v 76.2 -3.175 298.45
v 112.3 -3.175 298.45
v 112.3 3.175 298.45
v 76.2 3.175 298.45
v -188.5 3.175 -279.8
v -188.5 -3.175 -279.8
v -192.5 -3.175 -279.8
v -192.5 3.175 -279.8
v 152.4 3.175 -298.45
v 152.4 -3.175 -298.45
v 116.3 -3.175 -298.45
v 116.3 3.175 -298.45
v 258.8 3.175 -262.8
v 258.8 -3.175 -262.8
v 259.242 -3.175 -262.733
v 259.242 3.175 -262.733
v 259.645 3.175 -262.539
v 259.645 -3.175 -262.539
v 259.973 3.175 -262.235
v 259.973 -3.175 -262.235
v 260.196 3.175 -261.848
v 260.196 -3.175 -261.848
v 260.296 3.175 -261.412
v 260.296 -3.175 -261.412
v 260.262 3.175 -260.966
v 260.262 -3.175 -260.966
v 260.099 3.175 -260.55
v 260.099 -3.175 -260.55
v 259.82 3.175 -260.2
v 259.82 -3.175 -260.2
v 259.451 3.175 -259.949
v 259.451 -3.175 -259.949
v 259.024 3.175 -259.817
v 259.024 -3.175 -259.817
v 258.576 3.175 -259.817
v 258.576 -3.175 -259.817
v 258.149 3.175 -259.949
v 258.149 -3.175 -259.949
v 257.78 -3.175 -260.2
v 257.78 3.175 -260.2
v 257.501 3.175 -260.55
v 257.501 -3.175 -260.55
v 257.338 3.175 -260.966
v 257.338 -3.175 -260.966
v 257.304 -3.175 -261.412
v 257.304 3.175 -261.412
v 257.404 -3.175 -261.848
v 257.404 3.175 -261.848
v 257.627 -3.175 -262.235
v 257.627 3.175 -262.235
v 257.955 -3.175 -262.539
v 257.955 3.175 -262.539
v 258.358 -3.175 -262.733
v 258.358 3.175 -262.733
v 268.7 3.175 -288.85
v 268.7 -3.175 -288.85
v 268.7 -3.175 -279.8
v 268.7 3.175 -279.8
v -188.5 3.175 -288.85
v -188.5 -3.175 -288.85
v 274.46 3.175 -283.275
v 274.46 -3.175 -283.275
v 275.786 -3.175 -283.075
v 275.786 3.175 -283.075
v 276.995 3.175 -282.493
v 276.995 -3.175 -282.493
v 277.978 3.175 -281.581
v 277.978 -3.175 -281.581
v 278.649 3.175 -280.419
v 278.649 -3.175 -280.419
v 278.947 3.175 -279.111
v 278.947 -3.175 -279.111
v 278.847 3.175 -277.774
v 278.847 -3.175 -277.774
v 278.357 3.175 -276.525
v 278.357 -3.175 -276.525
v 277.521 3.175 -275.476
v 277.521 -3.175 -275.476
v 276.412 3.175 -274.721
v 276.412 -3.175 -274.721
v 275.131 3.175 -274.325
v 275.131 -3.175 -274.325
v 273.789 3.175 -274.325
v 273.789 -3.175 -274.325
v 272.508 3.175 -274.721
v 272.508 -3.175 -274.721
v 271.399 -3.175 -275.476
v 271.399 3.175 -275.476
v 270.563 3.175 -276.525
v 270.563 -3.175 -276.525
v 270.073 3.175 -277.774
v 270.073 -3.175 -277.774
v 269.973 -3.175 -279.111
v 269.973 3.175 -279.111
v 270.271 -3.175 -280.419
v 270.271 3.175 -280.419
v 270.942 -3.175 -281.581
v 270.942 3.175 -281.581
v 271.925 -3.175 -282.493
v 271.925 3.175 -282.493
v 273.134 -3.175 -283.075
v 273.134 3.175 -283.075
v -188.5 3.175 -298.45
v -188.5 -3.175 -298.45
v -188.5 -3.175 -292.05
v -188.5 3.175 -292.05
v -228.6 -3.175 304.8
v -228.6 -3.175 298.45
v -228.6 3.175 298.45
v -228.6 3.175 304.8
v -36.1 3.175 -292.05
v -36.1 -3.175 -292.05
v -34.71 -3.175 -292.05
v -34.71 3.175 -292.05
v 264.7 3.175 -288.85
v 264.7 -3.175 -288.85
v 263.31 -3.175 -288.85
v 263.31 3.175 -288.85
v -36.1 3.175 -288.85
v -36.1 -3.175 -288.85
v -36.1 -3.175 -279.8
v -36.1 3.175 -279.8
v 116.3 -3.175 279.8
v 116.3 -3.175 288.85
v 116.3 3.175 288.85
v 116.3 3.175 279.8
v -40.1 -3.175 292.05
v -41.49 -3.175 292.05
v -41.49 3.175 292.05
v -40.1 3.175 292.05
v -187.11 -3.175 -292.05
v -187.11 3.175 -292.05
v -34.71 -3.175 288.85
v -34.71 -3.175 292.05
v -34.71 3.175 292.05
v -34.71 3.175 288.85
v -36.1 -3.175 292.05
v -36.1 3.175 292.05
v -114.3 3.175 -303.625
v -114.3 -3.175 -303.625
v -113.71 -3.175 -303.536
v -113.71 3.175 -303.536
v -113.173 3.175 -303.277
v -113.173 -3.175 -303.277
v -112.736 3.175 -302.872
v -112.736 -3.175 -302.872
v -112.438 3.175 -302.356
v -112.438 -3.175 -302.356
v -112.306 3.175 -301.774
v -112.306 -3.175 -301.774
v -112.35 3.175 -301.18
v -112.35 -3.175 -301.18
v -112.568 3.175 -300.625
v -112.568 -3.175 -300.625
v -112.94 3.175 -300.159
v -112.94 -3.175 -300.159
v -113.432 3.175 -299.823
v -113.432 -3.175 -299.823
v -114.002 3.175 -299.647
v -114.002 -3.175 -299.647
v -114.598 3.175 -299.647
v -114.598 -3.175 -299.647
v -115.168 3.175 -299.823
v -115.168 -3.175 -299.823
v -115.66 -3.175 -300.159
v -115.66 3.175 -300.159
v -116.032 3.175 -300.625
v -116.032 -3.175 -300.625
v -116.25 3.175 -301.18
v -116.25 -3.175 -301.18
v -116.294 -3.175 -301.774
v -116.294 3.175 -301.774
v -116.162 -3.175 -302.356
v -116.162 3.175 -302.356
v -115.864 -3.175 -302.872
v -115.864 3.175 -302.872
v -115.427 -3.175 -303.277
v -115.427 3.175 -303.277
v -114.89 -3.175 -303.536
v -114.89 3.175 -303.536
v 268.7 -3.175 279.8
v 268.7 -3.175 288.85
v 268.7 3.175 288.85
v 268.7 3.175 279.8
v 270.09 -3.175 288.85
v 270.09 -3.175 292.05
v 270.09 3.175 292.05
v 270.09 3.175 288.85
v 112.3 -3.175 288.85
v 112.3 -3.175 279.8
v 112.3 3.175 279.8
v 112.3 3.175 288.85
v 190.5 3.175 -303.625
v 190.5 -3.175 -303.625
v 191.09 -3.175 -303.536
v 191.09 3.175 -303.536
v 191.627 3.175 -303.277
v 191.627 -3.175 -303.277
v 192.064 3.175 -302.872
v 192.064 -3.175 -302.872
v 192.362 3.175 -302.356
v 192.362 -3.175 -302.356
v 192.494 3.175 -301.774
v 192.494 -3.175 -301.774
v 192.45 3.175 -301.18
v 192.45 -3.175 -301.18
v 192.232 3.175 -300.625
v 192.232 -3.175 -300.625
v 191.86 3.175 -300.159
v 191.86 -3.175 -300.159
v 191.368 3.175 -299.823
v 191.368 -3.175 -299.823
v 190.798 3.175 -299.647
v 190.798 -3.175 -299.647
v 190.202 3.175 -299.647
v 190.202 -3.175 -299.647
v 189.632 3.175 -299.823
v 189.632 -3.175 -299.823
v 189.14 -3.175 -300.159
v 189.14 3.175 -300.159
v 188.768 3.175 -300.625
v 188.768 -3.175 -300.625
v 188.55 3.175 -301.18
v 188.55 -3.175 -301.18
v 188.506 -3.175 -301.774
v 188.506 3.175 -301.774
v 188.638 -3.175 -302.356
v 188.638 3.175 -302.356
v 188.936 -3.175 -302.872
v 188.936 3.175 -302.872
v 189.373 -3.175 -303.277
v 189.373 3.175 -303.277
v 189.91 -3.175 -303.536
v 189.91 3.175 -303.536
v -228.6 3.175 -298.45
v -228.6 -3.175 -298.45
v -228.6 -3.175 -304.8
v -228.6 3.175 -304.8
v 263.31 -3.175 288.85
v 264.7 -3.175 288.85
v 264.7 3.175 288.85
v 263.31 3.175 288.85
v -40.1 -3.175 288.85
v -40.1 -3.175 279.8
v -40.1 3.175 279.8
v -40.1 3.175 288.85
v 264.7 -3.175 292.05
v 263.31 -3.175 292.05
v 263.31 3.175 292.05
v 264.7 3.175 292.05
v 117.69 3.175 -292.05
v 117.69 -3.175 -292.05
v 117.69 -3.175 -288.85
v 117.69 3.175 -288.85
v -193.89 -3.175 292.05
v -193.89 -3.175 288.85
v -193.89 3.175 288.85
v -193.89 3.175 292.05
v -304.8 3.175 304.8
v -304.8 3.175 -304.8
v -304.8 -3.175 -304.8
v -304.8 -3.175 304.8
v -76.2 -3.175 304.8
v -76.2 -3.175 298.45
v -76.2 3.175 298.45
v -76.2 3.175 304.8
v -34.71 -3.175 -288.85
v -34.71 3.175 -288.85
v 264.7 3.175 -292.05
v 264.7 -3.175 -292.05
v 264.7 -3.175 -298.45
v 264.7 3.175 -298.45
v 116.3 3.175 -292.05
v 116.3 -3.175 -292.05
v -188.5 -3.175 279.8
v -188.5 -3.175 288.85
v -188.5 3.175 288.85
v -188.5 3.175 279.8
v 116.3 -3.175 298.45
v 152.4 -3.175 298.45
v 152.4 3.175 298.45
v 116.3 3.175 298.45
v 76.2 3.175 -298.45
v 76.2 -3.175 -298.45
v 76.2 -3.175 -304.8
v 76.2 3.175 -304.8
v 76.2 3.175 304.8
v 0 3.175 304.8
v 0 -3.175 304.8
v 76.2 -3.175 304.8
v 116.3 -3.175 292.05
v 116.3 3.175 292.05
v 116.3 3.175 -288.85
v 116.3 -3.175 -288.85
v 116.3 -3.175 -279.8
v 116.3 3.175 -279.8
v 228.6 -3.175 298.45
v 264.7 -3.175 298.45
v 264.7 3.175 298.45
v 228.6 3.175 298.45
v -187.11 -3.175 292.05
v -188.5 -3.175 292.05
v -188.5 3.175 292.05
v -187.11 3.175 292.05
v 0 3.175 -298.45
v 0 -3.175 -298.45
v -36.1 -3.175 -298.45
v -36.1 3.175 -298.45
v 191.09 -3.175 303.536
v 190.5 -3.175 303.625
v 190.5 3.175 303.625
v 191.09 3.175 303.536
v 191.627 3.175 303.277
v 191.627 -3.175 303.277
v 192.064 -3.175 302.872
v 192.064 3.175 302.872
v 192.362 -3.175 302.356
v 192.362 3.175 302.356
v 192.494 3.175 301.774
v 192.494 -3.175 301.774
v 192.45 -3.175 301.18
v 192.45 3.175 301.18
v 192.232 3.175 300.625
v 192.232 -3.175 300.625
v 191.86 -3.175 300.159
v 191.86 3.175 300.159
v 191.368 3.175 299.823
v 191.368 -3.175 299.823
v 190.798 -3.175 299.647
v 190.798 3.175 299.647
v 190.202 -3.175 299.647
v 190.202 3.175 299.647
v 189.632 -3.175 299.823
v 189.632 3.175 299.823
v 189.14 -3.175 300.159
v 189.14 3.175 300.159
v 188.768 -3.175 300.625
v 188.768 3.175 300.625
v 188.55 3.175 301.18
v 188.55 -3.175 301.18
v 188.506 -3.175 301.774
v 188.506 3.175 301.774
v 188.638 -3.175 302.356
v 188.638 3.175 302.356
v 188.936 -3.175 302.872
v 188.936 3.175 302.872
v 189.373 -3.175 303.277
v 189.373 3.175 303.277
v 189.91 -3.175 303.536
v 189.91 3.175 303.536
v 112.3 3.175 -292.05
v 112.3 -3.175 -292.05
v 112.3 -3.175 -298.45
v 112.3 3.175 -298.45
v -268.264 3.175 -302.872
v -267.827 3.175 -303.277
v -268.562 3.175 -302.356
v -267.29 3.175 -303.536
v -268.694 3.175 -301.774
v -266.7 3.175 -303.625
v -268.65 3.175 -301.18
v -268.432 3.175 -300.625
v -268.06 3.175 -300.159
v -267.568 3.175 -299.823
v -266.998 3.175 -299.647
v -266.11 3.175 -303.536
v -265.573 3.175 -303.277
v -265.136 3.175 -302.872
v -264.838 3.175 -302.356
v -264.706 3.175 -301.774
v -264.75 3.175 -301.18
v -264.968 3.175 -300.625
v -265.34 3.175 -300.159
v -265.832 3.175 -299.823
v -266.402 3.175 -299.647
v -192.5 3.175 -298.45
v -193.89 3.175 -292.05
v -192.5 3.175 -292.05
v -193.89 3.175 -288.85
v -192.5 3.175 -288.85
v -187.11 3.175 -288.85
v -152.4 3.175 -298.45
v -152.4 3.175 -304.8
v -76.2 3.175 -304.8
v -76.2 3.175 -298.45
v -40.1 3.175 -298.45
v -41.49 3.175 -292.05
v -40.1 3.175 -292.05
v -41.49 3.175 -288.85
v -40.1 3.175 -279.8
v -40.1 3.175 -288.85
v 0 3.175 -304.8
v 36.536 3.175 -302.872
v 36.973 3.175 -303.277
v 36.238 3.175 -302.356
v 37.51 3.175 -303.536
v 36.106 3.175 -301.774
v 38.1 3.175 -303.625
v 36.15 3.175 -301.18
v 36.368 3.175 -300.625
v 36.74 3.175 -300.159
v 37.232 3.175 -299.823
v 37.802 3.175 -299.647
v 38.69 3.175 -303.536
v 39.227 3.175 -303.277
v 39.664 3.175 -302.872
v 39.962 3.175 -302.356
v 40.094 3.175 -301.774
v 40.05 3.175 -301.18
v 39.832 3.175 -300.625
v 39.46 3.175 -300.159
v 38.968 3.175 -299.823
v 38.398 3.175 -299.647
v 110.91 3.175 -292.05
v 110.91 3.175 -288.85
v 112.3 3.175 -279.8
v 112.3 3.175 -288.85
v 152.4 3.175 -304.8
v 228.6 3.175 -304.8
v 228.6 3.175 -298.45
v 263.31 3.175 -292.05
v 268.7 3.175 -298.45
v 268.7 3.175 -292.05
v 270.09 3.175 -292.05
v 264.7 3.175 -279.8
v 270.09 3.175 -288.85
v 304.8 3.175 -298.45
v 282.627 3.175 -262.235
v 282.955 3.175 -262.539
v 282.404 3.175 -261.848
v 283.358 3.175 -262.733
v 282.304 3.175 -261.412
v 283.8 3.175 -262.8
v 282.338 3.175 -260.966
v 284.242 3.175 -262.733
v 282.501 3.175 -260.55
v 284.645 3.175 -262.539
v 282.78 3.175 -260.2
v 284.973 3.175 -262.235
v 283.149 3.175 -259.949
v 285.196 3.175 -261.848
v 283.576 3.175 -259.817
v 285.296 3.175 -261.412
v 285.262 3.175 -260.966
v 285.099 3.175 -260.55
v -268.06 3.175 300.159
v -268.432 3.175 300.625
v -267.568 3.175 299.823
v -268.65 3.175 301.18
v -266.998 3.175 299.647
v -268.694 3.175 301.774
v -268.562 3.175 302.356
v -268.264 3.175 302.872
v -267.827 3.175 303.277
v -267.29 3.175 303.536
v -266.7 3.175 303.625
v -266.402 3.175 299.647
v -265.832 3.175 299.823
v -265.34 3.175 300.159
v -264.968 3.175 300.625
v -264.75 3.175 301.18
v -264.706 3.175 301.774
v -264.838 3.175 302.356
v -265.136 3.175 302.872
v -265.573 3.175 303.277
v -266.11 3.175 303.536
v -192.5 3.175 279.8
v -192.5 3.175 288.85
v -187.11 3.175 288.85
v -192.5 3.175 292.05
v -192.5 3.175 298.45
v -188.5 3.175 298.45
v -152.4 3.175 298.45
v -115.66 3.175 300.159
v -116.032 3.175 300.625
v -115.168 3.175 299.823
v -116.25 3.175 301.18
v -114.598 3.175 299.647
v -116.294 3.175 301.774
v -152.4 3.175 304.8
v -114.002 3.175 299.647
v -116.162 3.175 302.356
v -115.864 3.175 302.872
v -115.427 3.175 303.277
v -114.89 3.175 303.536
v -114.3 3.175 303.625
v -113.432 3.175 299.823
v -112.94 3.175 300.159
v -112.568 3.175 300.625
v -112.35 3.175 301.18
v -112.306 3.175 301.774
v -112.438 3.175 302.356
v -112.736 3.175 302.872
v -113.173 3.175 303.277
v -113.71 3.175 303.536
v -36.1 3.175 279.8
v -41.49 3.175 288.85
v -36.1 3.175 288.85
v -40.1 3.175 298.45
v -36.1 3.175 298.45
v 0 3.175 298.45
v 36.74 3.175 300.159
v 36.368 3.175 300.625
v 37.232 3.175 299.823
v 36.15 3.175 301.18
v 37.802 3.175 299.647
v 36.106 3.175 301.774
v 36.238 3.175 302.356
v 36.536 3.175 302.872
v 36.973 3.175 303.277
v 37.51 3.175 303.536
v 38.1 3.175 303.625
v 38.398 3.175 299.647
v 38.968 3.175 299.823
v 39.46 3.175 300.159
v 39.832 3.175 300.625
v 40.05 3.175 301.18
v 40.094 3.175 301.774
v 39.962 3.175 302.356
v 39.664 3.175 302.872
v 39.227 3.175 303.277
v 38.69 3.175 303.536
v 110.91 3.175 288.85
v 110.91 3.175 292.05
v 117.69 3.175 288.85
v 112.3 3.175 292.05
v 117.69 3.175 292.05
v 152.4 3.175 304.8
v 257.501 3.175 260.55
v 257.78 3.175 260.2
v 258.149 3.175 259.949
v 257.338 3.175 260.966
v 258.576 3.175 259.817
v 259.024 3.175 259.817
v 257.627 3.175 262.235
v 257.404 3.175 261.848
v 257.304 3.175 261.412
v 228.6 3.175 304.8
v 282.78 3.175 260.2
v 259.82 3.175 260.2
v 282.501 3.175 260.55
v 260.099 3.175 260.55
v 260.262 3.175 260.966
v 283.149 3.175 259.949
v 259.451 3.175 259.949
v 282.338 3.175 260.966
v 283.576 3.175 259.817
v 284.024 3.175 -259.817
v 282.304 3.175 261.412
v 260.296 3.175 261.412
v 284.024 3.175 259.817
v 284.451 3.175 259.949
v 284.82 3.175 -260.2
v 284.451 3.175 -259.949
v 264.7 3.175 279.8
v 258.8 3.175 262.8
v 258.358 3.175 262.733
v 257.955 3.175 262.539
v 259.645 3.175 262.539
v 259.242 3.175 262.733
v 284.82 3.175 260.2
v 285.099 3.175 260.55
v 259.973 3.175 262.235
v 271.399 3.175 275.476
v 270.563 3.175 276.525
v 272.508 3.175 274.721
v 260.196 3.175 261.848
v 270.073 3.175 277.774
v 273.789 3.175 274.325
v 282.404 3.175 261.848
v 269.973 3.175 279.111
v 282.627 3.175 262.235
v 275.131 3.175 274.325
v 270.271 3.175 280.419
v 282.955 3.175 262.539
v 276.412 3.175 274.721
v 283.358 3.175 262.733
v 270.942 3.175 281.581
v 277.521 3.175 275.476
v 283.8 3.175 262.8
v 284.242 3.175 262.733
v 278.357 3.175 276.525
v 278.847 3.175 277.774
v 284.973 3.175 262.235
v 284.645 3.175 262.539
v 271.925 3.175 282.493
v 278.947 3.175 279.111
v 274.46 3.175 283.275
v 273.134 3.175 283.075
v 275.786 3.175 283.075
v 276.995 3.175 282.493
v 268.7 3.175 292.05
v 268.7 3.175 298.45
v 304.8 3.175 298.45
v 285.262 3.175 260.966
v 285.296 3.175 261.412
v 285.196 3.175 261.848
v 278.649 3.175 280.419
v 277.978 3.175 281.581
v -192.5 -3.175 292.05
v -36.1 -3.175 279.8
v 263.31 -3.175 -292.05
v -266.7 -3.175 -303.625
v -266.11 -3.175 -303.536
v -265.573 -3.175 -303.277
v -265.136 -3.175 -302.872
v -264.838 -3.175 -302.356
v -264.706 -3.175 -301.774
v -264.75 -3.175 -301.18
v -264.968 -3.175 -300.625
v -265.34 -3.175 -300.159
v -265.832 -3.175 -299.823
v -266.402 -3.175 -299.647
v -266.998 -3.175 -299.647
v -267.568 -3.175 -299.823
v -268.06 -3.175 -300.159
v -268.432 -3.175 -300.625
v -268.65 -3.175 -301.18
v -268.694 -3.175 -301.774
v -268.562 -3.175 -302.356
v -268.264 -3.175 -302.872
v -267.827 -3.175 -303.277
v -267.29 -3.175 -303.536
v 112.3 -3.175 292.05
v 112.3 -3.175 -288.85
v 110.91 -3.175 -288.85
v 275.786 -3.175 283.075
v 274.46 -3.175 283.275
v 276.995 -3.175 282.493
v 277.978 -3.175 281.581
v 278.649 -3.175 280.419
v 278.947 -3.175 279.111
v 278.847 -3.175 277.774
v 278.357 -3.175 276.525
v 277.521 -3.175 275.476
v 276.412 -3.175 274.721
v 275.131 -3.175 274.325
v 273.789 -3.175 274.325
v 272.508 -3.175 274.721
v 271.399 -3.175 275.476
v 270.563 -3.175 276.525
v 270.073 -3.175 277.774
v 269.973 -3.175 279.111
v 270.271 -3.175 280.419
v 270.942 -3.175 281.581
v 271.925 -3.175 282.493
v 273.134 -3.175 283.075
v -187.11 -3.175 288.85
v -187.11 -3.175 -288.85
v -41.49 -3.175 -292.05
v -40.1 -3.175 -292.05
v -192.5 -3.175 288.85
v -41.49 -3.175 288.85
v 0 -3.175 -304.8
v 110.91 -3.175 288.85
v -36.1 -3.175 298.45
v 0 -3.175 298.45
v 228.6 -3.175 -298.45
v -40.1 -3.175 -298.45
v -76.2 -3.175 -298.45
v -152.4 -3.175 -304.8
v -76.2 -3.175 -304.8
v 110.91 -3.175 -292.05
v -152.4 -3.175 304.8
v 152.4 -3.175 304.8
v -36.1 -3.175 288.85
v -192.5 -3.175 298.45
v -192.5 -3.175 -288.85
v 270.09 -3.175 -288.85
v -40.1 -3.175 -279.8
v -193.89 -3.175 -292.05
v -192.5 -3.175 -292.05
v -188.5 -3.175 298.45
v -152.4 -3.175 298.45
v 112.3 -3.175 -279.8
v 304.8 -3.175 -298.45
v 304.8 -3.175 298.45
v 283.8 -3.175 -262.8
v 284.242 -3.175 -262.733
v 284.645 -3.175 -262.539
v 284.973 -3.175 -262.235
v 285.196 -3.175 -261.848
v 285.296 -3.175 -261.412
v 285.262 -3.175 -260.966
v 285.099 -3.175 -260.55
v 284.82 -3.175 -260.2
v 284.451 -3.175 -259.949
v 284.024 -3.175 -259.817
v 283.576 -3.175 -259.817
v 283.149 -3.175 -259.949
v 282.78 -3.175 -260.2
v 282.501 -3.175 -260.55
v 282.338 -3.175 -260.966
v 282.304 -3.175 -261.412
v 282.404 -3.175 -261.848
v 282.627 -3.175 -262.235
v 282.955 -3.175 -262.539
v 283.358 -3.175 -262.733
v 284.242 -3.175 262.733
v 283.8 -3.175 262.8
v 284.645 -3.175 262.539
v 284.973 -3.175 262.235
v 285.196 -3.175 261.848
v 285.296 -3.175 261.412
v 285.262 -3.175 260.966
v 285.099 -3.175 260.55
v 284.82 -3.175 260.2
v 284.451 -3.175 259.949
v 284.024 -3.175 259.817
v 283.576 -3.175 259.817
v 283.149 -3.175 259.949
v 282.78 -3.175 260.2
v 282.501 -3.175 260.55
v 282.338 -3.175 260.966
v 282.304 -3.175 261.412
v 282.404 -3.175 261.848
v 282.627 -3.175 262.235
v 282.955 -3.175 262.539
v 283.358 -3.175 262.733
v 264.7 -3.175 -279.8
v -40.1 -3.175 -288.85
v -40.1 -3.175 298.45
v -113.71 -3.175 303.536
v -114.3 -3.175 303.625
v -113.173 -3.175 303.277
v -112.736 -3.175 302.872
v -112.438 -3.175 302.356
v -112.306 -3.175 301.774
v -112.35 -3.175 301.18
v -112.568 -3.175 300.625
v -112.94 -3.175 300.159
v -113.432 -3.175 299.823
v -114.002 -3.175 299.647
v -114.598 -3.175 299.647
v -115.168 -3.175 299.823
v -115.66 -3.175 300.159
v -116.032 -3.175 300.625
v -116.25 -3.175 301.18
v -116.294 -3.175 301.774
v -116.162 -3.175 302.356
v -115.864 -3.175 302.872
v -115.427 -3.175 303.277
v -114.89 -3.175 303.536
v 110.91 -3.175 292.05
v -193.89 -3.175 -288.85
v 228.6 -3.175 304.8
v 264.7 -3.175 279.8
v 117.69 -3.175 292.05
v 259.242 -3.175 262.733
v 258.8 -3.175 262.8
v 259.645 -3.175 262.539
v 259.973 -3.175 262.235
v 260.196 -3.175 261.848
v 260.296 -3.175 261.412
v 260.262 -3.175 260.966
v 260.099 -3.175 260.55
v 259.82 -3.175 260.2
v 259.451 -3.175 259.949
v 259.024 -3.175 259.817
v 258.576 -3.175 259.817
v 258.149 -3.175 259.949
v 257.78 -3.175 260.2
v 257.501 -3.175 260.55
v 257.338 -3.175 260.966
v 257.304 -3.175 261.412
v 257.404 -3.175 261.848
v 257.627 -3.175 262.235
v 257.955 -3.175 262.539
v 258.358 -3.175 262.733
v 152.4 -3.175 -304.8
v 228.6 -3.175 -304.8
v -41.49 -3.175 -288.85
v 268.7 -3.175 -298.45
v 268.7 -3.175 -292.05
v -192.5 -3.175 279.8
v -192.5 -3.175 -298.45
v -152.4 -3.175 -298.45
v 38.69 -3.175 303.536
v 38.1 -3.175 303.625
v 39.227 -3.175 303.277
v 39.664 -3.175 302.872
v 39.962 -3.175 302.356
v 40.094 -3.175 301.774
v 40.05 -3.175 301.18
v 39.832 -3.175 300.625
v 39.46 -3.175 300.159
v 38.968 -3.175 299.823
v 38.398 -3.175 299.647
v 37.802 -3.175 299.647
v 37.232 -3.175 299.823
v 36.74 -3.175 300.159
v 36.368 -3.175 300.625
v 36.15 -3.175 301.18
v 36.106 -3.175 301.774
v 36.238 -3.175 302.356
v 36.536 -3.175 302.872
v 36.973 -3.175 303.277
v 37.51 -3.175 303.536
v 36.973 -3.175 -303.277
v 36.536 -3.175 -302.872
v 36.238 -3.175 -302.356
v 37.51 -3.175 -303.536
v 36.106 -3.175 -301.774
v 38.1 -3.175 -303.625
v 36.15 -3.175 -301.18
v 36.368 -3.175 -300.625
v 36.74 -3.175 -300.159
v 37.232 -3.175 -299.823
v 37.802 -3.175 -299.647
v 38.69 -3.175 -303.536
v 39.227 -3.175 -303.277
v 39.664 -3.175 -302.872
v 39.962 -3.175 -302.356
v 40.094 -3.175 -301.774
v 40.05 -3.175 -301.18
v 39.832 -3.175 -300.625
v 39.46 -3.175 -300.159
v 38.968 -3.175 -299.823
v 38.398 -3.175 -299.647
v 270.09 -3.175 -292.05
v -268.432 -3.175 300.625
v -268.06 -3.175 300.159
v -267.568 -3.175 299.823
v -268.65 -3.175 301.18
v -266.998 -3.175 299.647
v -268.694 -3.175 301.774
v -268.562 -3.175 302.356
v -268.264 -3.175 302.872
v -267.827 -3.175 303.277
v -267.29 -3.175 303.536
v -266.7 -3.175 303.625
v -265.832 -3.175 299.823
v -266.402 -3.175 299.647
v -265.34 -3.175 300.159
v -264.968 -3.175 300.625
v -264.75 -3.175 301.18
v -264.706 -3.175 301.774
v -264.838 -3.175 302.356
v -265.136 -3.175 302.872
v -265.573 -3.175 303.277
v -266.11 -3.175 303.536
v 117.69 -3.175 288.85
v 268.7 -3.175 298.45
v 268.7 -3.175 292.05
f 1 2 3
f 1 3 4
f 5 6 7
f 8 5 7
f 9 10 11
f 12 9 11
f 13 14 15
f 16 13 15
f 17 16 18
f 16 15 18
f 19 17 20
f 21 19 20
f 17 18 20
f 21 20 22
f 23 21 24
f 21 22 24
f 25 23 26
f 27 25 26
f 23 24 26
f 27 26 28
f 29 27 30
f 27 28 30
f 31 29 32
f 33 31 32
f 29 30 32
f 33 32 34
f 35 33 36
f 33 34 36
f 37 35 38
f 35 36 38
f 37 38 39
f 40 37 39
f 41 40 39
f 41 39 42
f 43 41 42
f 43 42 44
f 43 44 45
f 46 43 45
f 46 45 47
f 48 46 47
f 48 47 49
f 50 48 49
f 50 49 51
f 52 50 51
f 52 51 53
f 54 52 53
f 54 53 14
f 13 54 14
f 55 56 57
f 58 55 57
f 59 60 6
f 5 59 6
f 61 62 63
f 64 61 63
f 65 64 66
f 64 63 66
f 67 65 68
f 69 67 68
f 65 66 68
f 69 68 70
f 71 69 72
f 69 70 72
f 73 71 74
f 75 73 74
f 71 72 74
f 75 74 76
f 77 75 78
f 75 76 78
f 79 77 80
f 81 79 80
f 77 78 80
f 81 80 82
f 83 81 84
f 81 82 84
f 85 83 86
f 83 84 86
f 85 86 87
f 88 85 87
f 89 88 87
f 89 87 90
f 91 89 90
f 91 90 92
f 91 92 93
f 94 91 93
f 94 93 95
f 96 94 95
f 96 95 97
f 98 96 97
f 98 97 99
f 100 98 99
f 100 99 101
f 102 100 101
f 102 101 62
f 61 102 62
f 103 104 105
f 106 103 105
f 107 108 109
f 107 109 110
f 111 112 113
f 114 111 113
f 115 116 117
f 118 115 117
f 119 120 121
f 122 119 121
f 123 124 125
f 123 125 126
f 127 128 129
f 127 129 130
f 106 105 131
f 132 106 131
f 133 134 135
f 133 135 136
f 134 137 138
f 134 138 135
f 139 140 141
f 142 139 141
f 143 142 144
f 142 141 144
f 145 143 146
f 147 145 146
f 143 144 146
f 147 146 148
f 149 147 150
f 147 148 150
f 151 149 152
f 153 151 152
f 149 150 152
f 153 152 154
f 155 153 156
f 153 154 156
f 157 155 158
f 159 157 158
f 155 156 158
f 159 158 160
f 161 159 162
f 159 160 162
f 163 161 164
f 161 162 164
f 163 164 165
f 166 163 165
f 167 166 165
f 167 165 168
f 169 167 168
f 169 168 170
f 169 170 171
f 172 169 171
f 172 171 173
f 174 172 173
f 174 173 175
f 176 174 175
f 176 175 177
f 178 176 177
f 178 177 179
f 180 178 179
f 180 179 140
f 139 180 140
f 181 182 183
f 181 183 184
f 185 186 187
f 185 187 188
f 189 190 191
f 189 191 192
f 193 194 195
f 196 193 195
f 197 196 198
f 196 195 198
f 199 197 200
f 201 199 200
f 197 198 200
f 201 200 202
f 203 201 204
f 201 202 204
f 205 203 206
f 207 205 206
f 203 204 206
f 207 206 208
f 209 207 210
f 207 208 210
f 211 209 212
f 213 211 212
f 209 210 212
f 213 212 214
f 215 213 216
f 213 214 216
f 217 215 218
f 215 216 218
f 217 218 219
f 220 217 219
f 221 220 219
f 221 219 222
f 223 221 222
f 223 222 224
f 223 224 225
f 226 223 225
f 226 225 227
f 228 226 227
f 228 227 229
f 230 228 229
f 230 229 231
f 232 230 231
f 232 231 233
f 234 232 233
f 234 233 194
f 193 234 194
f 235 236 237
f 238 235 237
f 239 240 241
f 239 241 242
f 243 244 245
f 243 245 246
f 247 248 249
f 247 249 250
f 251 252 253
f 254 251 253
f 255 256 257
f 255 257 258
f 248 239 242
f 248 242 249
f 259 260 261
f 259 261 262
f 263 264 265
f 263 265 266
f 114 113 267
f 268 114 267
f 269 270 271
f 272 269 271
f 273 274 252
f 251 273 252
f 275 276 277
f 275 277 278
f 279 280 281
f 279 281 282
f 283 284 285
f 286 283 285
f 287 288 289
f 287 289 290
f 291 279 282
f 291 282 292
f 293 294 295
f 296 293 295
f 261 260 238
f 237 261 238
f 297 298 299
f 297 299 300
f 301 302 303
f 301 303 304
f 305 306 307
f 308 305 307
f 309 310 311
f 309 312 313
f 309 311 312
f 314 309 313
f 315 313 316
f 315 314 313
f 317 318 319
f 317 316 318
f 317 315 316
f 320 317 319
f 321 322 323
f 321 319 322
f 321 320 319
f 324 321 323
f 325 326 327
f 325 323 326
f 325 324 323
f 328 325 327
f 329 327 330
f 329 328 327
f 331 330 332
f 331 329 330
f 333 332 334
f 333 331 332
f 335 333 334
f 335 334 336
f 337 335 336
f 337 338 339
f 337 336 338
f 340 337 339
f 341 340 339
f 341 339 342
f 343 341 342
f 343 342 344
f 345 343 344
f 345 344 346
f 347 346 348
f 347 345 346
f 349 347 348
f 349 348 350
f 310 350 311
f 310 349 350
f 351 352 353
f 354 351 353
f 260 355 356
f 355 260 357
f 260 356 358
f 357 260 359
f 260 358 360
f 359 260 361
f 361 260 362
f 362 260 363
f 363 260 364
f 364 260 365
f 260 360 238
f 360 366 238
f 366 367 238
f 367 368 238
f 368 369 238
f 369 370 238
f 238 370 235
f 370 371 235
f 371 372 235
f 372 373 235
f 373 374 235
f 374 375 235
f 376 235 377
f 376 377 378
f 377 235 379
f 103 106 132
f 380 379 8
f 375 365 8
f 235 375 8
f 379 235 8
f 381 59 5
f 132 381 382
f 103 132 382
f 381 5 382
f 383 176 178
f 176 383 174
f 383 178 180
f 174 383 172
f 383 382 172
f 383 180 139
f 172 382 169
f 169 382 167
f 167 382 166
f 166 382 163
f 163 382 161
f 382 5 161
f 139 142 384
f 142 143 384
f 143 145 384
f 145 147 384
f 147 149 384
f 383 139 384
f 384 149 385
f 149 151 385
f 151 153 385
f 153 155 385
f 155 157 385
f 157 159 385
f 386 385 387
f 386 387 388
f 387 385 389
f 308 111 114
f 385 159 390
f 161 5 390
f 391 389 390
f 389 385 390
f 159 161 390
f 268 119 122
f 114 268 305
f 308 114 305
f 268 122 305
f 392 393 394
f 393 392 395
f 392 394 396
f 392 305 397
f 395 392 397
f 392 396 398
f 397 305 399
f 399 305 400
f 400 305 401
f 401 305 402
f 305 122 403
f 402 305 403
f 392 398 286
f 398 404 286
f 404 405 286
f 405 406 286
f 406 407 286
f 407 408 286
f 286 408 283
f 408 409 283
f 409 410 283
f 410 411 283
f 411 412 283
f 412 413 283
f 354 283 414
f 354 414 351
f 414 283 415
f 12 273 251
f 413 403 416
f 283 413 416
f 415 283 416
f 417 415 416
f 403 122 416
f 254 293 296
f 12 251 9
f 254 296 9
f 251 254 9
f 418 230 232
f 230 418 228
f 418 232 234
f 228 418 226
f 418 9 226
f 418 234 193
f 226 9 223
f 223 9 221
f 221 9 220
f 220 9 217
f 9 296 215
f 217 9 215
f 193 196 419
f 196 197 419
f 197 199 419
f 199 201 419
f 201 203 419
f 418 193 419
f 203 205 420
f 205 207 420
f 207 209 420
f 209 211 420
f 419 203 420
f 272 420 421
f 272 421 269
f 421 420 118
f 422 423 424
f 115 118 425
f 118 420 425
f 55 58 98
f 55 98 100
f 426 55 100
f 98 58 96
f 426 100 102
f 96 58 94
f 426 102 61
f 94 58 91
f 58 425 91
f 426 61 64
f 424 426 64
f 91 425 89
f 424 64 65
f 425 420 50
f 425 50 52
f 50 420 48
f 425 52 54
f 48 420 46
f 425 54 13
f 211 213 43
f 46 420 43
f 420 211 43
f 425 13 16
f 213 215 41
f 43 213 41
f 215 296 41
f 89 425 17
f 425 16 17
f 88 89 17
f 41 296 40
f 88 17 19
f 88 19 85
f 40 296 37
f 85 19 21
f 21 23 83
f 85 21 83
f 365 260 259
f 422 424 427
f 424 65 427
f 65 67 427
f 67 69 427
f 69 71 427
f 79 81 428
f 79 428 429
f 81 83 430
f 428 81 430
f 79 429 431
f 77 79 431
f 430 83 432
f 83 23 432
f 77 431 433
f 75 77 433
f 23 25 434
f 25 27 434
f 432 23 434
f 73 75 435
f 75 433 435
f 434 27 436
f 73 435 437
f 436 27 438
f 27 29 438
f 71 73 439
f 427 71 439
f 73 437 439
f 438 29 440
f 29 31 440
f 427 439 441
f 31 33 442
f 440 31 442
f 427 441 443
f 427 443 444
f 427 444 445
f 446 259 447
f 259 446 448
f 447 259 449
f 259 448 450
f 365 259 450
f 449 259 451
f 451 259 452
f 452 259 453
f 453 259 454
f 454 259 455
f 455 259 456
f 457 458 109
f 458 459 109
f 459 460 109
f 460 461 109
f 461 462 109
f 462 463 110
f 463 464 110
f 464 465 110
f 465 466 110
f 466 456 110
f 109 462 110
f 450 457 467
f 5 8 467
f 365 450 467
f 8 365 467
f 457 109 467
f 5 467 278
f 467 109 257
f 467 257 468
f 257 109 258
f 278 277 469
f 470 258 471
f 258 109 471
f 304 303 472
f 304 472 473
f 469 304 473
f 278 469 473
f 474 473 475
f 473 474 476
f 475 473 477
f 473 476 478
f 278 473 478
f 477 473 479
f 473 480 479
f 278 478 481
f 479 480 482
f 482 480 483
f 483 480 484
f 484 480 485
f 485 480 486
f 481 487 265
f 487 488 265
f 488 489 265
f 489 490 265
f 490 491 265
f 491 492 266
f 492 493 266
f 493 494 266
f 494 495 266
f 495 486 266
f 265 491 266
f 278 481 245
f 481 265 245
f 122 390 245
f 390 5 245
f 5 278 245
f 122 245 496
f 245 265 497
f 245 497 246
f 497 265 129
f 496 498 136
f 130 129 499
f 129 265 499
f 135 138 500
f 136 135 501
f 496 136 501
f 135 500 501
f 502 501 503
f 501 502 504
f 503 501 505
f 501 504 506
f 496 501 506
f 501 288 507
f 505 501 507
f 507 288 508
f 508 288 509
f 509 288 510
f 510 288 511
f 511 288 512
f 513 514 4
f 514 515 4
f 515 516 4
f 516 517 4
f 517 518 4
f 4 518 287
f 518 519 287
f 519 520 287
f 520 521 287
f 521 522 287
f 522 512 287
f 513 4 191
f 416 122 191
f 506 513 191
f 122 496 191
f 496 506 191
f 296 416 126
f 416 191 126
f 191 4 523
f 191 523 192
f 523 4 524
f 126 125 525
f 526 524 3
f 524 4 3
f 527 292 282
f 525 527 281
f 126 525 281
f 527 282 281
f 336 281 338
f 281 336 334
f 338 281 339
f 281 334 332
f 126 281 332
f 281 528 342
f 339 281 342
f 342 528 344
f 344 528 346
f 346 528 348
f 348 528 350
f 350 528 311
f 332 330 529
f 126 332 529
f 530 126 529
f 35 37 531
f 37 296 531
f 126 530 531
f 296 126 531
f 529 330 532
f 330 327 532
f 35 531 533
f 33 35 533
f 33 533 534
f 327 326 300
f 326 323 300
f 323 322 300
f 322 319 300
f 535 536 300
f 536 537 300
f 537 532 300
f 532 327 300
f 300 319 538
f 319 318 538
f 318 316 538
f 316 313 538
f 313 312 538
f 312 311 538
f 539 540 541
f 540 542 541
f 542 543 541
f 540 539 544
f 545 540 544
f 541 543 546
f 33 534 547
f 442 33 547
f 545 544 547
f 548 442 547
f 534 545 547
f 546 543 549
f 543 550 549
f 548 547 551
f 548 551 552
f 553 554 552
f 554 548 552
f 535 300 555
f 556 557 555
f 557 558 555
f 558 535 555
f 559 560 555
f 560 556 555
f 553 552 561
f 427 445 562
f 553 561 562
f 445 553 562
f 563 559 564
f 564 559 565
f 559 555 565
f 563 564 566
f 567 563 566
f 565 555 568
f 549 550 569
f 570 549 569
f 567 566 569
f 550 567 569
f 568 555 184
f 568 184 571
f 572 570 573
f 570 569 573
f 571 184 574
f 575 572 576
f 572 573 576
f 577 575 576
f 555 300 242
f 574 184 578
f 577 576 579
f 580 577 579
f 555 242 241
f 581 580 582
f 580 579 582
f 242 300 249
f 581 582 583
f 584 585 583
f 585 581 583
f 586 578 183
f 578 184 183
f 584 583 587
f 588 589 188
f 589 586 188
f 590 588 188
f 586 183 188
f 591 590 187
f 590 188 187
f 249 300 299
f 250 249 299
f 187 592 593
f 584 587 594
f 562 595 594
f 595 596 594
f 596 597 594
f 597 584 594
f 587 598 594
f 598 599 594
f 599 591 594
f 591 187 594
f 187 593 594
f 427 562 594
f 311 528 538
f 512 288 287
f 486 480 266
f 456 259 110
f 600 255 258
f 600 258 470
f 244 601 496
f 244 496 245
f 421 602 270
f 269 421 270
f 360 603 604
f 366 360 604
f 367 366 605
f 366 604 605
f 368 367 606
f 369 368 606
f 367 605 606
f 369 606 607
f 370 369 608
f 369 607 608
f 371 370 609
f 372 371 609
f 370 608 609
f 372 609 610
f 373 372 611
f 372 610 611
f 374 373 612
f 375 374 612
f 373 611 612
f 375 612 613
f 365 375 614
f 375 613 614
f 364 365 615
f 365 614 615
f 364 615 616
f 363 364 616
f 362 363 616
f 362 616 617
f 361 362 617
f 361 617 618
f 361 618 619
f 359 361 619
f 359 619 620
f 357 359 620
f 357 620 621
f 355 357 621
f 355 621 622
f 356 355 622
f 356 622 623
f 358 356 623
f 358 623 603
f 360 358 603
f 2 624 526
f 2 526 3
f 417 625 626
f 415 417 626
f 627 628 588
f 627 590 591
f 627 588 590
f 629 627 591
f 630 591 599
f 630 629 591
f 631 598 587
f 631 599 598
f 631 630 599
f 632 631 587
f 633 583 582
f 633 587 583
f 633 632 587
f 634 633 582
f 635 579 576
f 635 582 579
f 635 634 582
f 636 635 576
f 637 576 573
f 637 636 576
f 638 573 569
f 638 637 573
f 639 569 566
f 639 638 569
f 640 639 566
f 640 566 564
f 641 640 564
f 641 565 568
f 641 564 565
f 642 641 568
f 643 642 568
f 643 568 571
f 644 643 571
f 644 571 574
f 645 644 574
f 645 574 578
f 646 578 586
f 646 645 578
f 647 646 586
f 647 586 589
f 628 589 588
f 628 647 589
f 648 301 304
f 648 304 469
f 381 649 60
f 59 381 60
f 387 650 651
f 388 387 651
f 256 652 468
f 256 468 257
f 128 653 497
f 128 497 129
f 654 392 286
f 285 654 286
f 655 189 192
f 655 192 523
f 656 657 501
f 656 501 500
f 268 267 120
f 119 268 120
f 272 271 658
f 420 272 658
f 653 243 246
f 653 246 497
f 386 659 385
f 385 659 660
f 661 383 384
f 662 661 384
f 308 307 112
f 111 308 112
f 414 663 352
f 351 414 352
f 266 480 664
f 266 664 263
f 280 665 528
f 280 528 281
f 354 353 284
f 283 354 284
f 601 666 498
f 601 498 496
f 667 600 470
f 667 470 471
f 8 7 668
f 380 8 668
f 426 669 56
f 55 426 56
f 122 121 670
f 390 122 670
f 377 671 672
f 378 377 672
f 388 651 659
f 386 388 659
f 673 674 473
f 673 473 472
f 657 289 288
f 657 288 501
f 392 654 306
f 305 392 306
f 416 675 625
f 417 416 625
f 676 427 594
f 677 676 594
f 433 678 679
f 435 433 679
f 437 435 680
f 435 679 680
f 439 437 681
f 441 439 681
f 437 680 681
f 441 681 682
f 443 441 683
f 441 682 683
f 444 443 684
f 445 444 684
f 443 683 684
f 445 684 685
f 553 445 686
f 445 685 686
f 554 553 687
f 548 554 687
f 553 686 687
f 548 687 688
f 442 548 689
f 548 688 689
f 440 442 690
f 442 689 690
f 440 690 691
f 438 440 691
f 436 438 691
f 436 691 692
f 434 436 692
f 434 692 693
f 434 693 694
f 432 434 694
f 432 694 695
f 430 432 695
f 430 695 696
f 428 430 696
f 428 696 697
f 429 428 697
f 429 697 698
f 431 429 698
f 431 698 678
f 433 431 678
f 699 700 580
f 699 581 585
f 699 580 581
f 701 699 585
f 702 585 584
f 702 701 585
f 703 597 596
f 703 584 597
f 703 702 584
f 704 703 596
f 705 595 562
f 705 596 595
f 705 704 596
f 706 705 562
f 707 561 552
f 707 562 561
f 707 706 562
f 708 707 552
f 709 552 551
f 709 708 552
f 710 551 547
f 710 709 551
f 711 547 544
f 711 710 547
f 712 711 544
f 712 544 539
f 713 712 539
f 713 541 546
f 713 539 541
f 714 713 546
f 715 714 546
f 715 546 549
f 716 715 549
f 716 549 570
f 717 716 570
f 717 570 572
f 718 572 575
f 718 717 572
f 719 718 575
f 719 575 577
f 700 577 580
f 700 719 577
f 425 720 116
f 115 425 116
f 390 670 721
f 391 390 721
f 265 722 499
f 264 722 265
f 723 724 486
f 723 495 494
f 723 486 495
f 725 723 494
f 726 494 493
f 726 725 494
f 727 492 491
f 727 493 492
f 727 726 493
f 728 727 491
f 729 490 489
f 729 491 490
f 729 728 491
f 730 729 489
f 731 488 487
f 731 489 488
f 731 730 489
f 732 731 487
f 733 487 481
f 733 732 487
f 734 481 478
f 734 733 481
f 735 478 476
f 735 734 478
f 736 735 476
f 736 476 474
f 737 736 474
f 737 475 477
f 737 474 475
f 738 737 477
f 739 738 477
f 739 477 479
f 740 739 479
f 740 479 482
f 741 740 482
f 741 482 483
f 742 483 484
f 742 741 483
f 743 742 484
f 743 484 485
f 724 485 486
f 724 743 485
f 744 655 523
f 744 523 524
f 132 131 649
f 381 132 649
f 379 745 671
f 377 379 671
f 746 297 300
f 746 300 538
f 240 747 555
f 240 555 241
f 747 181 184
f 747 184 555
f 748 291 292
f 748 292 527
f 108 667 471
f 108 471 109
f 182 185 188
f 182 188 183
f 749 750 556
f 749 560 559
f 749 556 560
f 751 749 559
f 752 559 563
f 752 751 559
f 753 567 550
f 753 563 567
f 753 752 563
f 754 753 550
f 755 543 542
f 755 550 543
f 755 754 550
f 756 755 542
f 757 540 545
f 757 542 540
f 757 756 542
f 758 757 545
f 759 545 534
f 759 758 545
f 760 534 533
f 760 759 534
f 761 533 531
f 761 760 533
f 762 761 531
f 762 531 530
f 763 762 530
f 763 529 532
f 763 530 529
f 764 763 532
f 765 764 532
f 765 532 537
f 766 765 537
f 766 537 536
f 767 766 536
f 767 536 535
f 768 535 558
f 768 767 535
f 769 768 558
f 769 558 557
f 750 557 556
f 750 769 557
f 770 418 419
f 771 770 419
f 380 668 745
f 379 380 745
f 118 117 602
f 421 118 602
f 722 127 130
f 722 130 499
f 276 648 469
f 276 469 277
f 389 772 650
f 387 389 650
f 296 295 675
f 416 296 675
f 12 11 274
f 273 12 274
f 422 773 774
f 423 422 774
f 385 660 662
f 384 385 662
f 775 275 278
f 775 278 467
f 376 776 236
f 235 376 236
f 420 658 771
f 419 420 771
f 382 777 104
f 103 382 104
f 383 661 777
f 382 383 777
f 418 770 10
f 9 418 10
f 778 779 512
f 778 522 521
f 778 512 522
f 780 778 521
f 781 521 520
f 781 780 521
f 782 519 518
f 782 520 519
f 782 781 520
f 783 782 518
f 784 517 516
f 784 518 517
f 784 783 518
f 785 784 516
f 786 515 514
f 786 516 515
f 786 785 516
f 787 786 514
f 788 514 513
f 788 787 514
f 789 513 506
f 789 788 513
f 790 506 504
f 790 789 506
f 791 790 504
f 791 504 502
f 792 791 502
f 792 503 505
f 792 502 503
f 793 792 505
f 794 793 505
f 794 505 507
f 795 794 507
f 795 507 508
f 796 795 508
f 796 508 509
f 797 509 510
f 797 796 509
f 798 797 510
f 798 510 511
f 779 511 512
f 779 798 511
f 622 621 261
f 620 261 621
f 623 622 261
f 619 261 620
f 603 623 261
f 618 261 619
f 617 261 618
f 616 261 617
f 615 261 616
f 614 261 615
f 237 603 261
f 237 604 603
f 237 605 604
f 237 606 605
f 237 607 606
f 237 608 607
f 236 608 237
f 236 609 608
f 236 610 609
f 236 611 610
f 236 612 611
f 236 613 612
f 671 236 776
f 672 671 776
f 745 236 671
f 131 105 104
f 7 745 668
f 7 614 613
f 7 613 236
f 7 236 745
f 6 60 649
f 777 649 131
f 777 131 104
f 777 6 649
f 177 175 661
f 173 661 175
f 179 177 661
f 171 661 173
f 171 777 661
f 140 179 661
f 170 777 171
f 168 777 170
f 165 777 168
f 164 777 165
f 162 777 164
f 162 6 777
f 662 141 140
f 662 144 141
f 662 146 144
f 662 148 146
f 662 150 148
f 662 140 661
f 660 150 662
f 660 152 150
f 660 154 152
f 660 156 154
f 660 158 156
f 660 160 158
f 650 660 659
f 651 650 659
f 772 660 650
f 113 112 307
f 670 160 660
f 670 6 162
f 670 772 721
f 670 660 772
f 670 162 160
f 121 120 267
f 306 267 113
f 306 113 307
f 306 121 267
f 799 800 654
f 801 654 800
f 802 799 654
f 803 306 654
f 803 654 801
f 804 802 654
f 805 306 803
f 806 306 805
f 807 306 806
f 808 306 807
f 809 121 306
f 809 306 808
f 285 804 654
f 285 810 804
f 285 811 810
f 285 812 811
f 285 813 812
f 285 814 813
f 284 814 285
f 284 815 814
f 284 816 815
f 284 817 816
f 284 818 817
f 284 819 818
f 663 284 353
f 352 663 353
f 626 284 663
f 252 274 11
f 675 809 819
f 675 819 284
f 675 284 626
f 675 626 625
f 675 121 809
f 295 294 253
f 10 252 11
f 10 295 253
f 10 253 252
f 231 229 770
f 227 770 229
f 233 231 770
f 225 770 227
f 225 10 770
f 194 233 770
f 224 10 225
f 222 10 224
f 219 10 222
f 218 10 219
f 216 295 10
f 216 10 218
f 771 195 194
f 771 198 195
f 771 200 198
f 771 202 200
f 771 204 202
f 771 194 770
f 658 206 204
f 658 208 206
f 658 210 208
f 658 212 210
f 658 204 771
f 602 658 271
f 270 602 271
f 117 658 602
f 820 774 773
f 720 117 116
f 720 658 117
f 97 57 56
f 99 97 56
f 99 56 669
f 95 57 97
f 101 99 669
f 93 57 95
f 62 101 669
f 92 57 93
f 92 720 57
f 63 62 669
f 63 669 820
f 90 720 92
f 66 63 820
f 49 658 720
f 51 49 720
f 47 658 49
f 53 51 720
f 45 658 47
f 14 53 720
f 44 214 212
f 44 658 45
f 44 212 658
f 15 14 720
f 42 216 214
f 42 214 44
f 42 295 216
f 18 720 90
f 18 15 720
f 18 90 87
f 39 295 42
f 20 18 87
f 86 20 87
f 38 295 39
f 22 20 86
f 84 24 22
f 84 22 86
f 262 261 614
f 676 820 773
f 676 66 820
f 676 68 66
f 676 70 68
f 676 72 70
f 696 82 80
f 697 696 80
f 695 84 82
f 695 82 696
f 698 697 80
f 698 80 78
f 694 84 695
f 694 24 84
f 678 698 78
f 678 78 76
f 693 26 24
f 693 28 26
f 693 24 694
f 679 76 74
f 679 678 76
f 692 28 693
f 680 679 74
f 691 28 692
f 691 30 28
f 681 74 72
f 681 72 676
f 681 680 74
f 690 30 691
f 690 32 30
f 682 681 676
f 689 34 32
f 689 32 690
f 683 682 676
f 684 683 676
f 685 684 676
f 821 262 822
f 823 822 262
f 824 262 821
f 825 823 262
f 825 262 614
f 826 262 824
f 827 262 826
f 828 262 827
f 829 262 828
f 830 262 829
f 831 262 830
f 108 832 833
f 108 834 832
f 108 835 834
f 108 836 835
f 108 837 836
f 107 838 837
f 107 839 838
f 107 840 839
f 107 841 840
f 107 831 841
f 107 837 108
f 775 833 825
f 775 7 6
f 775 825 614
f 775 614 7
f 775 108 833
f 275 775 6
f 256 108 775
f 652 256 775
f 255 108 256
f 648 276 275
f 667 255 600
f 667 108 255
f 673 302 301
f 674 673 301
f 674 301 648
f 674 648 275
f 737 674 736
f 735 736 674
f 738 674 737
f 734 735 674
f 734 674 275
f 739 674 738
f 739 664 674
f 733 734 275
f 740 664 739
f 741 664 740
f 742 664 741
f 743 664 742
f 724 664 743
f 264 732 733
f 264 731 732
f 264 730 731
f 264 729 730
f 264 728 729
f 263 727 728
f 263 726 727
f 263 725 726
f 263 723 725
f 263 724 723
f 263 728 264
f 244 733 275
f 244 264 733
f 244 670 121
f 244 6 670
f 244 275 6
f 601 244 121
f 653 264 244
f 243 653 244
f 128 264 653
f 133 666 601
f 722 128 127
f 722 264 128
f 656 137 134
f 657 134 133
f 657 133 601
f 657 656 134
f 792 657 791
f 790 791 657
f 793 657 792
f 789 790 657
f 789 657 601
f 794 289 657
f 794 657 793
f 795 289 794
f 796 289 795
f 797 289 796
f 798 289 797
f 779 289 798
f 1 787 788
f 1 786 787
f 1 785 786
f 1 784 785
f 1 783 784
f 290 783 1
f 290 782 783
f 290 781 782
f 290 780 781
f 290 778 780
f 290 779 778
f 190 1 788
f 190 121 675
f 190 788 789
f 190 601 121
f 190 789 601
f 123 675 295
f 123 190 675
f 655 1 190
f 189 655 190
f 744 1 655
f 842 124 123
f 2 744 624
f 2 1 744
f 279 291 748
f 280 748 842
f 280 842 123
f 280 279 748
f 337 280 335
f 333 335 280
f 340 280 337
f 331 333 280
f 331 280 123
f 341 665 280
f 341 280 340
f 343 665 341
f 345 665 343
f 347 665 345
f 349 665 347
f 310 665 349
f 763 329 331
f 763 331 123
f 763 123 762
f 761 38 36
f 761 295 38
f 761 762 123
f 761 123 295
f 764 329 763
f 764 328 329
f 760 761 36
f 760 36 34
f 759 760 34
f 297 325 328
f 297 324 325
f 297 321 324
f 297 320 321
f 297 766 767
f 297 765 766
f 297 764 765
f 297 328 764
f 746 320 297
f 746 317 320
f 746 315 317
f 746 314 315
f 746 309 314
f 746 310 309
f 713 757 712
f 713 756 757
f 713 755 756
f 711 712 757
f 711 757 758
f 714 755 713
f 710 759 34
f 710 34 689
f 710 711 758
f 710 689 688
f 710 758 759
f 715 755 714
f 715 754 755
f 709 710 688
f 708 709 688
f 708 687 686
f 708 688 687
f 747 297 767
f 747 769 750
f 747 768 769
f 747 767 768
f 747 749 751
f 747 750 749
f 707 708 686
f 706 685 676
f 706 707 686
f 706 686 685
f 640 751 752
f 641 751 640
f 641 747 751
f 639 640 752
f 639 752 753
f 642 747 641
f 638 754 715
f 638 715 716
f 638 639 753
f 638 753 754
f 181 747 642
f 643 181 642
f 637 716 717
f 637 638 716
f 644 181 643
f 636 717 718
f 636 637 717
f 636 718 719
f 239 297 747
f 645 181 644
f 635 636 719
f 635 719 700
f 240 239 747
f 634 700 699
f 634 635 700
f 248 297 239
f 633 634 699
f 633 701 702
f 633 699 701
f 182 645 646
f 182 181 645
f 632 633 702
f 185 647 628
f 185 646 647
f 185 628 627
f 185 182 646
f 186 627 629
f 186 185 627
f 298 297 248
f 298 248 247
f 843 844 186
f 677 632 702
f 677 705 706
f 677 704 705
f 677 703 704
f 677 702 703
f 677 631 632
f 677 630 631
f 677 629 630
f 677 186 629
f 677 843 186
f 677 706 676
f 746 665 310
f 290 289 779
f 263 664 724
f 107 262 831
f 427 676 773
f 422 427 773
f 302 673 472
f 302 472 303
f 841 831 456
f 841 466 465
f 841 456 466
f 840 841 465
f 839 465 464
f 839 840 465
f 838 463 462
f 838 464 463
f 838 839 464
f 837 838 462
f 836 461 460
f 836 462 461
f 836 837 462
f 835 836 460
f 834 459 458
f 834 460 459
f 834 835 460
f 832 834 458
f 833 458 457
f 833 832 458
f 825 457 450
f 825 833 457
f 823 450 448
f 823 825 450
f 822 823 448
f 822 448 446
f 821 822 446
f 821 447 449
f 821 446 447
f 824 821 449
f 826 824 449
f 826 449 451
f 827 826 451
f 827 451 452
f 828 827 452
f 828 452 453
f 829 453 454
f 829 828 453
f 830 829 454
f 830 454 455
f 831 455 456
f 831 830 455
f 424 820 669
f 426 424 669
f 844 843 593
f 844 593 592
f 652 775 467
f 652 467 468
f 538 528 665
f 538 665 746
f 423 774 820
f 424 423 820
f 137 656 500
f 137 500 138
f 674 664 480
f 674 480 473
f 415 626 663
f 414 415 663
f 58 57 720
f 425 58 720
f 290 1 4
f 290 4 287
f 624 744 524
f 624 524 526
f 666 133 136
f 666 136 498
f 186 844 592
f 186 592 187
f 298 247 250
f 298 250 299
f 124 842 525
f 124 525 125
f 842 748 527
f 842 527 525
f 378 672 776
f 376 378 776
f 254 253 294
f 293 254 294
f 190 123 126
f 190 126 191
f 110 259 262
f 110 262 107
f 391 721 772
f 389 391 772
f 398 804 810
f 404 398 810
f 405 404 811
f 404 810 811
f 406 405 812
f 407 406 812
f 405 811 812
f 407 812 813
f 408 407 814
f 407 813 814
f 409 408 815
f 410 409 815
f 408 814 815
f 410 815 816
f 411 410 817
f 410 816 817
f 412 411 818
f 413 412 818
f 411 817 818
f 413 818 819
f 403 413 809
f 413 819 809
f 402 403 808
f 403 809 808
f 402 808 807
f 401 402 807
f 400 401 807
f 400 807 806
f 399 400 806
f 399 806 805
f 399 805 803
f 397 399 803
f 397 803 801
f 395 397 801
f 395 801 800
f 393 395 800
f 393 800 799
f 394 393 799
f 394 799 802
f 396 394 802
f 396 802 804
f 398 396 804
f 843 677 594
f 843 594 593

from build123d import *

# Parameters (mm, degrees)
SKETCH1_W           = 609.6
SKETCH1_H           = 304.8
BOSS_EXTRUDE1_DEPTH = 3.175
CUT_EXTRUDE1_START  = -10
SKETCH2_R           = 2
SKETCH2_R_2         = 4.5
SKETCH2_R_3         = 1.5
CUT_EXTRUDE1_DEPTH  = 12.54


with BuildPart() as part:
    # Sketch1 → Boss-Extrude1 (new, symmetric)
    with BuildSketch(Plane(origin=(0, 0, 0), x_dir=(1, 0, 0), z_dir=(0, 1, 0))):
        with Locations((0, -152.4)):
            Rectangle(SKETCH1_W, SKETCH1_H)
    boss_extrude1 = extrude(amount=BOSS_EXTRUDE1_DEPTH, both=True)

    # Sketch2 → Cut-Extrude1 (cut)
    with BuildSketch(Plane(origin=(0, 3.175, 0), x_dir=(1, 0, 0), z_dir=(0, 1, 0)).offset(CUT_EXTRUDE1_START)):
        with Locations(Location((-266.7, -301.625, 0), (0, 0, 270))):
            Circle(SKETCH2_R)
        Polygon((-228.6, -298.45), (-228.6, -304.8), (-152.4, -304.8), (-152.4, -298.45), (-188.5, -298.45), (-192.5, -298.45), align=None)
        Polygon((-192.5, -292.05), (-192.5, -298.45), (-188.5, -298.45), (-188.5, -292.05), (-187.11, -292.05), (-187.11, -288.85), (-188.5, -288.85), (-188.5, -279.8), (-192.5, -279.8), (-192.5, -288.85), (-193.89, -288.85), (-193.89, -292.05), align=None)
        with Locations(Location((-114.3, -301.625, 0), (0, 0, 270))):
            Circle(SKETCH2_R)
        Polygon((-76.2, -298.45), (-76.2, -304.8), (0, -304.8), (0, -298.45), (-36.1, -298.45), (-40.1, -298.45), align=None)
        Polygon((-40.1, -292.05), (-40.1, -298.45), (-36.1, -298.45), (-36.1, -292.05), (-34.71, -292.05), (-34.71, -288.85), (-36.1, -288.85), (-36.1, -279.8), (-40.1, -279.8), (-40.1, -288.85), (-41.49, -288.85), (-41.49, -292.05), align=None)
        with Locations(Location((38.1, -301.625, 0), (0, 0, 270))):
            Circle(SKETCH2_R)
        Polygon((76.2, -298.45), (76.2, -304.8), (152.4, -304.8), (152.4, -298.45), (116.3, -298.45), (112.3, -298.45), align=None)
        Polygon((112.3, -292.05), (112.3, -298.45), (116.3, -298.45), (116.3, -292.05), (117.69, -292.05), (117.69, -288.85), (116.3, -288.85), (116.3, -279.8), (112.3, -279.8), (112.3, -288.85), (110.91, -288.85), (110.91, -292.05), align=None)
        with Locations(Location((190.5, -301.625, 0), (0, 0, 270))):
            Circle(SKETCH2_R)
        Polygon((228.6, -298.45), (228.6, -304.8), (304.8, -304.8), (304.8, -298.45), (268.7, -298.45), (264.7, -298.45), align=None)
        Polygon((264.7, -292.05), (264.7, -298.45), (268.7, -298.45), (268.7, -292.05), (270.09, -292.05), (270.09, -288.85), (268.7, -288.85), (268.7, -279.8), (264.7, -279.8), (264.7, -288.85), (263.31, -288.85), (263.31, -292.05), align=None)
        with Locations(Location((274.46, -278.775, 0), (0, 0, 270))):
            Circle(SKETCH2_R_2)
        with Locations(Location((283.8, -261.3, 0), (0, 0, 270))):
            Circle(SKETCH2_R_3)
        with Locations(Location((258.8, -261.3, 0), (0, 0, 270))):
            Circle(SKETCH2_R_3)
    cut_extrude1 = extrude(amount=CUT_EXTRUDE1_DEPTH, mode=Mode.SUBTRACT)

    # Mirror1: Boss-Extrude1, Cut-Extrude1 across plane
    add(boss_extrude1.mirror(Plane(origin=(0, 3.175, 0), x_dir=(1, 0, 0), z_dir=(0, 0, -1))))
    add(cut_extrude1.mirror(Plane(origin=(0, 3.175, 0), x_dir=(1, 0, 0), z_dir=(0, 0, -1))), mode=Mode.SUBTRACT)


solid = part.part
